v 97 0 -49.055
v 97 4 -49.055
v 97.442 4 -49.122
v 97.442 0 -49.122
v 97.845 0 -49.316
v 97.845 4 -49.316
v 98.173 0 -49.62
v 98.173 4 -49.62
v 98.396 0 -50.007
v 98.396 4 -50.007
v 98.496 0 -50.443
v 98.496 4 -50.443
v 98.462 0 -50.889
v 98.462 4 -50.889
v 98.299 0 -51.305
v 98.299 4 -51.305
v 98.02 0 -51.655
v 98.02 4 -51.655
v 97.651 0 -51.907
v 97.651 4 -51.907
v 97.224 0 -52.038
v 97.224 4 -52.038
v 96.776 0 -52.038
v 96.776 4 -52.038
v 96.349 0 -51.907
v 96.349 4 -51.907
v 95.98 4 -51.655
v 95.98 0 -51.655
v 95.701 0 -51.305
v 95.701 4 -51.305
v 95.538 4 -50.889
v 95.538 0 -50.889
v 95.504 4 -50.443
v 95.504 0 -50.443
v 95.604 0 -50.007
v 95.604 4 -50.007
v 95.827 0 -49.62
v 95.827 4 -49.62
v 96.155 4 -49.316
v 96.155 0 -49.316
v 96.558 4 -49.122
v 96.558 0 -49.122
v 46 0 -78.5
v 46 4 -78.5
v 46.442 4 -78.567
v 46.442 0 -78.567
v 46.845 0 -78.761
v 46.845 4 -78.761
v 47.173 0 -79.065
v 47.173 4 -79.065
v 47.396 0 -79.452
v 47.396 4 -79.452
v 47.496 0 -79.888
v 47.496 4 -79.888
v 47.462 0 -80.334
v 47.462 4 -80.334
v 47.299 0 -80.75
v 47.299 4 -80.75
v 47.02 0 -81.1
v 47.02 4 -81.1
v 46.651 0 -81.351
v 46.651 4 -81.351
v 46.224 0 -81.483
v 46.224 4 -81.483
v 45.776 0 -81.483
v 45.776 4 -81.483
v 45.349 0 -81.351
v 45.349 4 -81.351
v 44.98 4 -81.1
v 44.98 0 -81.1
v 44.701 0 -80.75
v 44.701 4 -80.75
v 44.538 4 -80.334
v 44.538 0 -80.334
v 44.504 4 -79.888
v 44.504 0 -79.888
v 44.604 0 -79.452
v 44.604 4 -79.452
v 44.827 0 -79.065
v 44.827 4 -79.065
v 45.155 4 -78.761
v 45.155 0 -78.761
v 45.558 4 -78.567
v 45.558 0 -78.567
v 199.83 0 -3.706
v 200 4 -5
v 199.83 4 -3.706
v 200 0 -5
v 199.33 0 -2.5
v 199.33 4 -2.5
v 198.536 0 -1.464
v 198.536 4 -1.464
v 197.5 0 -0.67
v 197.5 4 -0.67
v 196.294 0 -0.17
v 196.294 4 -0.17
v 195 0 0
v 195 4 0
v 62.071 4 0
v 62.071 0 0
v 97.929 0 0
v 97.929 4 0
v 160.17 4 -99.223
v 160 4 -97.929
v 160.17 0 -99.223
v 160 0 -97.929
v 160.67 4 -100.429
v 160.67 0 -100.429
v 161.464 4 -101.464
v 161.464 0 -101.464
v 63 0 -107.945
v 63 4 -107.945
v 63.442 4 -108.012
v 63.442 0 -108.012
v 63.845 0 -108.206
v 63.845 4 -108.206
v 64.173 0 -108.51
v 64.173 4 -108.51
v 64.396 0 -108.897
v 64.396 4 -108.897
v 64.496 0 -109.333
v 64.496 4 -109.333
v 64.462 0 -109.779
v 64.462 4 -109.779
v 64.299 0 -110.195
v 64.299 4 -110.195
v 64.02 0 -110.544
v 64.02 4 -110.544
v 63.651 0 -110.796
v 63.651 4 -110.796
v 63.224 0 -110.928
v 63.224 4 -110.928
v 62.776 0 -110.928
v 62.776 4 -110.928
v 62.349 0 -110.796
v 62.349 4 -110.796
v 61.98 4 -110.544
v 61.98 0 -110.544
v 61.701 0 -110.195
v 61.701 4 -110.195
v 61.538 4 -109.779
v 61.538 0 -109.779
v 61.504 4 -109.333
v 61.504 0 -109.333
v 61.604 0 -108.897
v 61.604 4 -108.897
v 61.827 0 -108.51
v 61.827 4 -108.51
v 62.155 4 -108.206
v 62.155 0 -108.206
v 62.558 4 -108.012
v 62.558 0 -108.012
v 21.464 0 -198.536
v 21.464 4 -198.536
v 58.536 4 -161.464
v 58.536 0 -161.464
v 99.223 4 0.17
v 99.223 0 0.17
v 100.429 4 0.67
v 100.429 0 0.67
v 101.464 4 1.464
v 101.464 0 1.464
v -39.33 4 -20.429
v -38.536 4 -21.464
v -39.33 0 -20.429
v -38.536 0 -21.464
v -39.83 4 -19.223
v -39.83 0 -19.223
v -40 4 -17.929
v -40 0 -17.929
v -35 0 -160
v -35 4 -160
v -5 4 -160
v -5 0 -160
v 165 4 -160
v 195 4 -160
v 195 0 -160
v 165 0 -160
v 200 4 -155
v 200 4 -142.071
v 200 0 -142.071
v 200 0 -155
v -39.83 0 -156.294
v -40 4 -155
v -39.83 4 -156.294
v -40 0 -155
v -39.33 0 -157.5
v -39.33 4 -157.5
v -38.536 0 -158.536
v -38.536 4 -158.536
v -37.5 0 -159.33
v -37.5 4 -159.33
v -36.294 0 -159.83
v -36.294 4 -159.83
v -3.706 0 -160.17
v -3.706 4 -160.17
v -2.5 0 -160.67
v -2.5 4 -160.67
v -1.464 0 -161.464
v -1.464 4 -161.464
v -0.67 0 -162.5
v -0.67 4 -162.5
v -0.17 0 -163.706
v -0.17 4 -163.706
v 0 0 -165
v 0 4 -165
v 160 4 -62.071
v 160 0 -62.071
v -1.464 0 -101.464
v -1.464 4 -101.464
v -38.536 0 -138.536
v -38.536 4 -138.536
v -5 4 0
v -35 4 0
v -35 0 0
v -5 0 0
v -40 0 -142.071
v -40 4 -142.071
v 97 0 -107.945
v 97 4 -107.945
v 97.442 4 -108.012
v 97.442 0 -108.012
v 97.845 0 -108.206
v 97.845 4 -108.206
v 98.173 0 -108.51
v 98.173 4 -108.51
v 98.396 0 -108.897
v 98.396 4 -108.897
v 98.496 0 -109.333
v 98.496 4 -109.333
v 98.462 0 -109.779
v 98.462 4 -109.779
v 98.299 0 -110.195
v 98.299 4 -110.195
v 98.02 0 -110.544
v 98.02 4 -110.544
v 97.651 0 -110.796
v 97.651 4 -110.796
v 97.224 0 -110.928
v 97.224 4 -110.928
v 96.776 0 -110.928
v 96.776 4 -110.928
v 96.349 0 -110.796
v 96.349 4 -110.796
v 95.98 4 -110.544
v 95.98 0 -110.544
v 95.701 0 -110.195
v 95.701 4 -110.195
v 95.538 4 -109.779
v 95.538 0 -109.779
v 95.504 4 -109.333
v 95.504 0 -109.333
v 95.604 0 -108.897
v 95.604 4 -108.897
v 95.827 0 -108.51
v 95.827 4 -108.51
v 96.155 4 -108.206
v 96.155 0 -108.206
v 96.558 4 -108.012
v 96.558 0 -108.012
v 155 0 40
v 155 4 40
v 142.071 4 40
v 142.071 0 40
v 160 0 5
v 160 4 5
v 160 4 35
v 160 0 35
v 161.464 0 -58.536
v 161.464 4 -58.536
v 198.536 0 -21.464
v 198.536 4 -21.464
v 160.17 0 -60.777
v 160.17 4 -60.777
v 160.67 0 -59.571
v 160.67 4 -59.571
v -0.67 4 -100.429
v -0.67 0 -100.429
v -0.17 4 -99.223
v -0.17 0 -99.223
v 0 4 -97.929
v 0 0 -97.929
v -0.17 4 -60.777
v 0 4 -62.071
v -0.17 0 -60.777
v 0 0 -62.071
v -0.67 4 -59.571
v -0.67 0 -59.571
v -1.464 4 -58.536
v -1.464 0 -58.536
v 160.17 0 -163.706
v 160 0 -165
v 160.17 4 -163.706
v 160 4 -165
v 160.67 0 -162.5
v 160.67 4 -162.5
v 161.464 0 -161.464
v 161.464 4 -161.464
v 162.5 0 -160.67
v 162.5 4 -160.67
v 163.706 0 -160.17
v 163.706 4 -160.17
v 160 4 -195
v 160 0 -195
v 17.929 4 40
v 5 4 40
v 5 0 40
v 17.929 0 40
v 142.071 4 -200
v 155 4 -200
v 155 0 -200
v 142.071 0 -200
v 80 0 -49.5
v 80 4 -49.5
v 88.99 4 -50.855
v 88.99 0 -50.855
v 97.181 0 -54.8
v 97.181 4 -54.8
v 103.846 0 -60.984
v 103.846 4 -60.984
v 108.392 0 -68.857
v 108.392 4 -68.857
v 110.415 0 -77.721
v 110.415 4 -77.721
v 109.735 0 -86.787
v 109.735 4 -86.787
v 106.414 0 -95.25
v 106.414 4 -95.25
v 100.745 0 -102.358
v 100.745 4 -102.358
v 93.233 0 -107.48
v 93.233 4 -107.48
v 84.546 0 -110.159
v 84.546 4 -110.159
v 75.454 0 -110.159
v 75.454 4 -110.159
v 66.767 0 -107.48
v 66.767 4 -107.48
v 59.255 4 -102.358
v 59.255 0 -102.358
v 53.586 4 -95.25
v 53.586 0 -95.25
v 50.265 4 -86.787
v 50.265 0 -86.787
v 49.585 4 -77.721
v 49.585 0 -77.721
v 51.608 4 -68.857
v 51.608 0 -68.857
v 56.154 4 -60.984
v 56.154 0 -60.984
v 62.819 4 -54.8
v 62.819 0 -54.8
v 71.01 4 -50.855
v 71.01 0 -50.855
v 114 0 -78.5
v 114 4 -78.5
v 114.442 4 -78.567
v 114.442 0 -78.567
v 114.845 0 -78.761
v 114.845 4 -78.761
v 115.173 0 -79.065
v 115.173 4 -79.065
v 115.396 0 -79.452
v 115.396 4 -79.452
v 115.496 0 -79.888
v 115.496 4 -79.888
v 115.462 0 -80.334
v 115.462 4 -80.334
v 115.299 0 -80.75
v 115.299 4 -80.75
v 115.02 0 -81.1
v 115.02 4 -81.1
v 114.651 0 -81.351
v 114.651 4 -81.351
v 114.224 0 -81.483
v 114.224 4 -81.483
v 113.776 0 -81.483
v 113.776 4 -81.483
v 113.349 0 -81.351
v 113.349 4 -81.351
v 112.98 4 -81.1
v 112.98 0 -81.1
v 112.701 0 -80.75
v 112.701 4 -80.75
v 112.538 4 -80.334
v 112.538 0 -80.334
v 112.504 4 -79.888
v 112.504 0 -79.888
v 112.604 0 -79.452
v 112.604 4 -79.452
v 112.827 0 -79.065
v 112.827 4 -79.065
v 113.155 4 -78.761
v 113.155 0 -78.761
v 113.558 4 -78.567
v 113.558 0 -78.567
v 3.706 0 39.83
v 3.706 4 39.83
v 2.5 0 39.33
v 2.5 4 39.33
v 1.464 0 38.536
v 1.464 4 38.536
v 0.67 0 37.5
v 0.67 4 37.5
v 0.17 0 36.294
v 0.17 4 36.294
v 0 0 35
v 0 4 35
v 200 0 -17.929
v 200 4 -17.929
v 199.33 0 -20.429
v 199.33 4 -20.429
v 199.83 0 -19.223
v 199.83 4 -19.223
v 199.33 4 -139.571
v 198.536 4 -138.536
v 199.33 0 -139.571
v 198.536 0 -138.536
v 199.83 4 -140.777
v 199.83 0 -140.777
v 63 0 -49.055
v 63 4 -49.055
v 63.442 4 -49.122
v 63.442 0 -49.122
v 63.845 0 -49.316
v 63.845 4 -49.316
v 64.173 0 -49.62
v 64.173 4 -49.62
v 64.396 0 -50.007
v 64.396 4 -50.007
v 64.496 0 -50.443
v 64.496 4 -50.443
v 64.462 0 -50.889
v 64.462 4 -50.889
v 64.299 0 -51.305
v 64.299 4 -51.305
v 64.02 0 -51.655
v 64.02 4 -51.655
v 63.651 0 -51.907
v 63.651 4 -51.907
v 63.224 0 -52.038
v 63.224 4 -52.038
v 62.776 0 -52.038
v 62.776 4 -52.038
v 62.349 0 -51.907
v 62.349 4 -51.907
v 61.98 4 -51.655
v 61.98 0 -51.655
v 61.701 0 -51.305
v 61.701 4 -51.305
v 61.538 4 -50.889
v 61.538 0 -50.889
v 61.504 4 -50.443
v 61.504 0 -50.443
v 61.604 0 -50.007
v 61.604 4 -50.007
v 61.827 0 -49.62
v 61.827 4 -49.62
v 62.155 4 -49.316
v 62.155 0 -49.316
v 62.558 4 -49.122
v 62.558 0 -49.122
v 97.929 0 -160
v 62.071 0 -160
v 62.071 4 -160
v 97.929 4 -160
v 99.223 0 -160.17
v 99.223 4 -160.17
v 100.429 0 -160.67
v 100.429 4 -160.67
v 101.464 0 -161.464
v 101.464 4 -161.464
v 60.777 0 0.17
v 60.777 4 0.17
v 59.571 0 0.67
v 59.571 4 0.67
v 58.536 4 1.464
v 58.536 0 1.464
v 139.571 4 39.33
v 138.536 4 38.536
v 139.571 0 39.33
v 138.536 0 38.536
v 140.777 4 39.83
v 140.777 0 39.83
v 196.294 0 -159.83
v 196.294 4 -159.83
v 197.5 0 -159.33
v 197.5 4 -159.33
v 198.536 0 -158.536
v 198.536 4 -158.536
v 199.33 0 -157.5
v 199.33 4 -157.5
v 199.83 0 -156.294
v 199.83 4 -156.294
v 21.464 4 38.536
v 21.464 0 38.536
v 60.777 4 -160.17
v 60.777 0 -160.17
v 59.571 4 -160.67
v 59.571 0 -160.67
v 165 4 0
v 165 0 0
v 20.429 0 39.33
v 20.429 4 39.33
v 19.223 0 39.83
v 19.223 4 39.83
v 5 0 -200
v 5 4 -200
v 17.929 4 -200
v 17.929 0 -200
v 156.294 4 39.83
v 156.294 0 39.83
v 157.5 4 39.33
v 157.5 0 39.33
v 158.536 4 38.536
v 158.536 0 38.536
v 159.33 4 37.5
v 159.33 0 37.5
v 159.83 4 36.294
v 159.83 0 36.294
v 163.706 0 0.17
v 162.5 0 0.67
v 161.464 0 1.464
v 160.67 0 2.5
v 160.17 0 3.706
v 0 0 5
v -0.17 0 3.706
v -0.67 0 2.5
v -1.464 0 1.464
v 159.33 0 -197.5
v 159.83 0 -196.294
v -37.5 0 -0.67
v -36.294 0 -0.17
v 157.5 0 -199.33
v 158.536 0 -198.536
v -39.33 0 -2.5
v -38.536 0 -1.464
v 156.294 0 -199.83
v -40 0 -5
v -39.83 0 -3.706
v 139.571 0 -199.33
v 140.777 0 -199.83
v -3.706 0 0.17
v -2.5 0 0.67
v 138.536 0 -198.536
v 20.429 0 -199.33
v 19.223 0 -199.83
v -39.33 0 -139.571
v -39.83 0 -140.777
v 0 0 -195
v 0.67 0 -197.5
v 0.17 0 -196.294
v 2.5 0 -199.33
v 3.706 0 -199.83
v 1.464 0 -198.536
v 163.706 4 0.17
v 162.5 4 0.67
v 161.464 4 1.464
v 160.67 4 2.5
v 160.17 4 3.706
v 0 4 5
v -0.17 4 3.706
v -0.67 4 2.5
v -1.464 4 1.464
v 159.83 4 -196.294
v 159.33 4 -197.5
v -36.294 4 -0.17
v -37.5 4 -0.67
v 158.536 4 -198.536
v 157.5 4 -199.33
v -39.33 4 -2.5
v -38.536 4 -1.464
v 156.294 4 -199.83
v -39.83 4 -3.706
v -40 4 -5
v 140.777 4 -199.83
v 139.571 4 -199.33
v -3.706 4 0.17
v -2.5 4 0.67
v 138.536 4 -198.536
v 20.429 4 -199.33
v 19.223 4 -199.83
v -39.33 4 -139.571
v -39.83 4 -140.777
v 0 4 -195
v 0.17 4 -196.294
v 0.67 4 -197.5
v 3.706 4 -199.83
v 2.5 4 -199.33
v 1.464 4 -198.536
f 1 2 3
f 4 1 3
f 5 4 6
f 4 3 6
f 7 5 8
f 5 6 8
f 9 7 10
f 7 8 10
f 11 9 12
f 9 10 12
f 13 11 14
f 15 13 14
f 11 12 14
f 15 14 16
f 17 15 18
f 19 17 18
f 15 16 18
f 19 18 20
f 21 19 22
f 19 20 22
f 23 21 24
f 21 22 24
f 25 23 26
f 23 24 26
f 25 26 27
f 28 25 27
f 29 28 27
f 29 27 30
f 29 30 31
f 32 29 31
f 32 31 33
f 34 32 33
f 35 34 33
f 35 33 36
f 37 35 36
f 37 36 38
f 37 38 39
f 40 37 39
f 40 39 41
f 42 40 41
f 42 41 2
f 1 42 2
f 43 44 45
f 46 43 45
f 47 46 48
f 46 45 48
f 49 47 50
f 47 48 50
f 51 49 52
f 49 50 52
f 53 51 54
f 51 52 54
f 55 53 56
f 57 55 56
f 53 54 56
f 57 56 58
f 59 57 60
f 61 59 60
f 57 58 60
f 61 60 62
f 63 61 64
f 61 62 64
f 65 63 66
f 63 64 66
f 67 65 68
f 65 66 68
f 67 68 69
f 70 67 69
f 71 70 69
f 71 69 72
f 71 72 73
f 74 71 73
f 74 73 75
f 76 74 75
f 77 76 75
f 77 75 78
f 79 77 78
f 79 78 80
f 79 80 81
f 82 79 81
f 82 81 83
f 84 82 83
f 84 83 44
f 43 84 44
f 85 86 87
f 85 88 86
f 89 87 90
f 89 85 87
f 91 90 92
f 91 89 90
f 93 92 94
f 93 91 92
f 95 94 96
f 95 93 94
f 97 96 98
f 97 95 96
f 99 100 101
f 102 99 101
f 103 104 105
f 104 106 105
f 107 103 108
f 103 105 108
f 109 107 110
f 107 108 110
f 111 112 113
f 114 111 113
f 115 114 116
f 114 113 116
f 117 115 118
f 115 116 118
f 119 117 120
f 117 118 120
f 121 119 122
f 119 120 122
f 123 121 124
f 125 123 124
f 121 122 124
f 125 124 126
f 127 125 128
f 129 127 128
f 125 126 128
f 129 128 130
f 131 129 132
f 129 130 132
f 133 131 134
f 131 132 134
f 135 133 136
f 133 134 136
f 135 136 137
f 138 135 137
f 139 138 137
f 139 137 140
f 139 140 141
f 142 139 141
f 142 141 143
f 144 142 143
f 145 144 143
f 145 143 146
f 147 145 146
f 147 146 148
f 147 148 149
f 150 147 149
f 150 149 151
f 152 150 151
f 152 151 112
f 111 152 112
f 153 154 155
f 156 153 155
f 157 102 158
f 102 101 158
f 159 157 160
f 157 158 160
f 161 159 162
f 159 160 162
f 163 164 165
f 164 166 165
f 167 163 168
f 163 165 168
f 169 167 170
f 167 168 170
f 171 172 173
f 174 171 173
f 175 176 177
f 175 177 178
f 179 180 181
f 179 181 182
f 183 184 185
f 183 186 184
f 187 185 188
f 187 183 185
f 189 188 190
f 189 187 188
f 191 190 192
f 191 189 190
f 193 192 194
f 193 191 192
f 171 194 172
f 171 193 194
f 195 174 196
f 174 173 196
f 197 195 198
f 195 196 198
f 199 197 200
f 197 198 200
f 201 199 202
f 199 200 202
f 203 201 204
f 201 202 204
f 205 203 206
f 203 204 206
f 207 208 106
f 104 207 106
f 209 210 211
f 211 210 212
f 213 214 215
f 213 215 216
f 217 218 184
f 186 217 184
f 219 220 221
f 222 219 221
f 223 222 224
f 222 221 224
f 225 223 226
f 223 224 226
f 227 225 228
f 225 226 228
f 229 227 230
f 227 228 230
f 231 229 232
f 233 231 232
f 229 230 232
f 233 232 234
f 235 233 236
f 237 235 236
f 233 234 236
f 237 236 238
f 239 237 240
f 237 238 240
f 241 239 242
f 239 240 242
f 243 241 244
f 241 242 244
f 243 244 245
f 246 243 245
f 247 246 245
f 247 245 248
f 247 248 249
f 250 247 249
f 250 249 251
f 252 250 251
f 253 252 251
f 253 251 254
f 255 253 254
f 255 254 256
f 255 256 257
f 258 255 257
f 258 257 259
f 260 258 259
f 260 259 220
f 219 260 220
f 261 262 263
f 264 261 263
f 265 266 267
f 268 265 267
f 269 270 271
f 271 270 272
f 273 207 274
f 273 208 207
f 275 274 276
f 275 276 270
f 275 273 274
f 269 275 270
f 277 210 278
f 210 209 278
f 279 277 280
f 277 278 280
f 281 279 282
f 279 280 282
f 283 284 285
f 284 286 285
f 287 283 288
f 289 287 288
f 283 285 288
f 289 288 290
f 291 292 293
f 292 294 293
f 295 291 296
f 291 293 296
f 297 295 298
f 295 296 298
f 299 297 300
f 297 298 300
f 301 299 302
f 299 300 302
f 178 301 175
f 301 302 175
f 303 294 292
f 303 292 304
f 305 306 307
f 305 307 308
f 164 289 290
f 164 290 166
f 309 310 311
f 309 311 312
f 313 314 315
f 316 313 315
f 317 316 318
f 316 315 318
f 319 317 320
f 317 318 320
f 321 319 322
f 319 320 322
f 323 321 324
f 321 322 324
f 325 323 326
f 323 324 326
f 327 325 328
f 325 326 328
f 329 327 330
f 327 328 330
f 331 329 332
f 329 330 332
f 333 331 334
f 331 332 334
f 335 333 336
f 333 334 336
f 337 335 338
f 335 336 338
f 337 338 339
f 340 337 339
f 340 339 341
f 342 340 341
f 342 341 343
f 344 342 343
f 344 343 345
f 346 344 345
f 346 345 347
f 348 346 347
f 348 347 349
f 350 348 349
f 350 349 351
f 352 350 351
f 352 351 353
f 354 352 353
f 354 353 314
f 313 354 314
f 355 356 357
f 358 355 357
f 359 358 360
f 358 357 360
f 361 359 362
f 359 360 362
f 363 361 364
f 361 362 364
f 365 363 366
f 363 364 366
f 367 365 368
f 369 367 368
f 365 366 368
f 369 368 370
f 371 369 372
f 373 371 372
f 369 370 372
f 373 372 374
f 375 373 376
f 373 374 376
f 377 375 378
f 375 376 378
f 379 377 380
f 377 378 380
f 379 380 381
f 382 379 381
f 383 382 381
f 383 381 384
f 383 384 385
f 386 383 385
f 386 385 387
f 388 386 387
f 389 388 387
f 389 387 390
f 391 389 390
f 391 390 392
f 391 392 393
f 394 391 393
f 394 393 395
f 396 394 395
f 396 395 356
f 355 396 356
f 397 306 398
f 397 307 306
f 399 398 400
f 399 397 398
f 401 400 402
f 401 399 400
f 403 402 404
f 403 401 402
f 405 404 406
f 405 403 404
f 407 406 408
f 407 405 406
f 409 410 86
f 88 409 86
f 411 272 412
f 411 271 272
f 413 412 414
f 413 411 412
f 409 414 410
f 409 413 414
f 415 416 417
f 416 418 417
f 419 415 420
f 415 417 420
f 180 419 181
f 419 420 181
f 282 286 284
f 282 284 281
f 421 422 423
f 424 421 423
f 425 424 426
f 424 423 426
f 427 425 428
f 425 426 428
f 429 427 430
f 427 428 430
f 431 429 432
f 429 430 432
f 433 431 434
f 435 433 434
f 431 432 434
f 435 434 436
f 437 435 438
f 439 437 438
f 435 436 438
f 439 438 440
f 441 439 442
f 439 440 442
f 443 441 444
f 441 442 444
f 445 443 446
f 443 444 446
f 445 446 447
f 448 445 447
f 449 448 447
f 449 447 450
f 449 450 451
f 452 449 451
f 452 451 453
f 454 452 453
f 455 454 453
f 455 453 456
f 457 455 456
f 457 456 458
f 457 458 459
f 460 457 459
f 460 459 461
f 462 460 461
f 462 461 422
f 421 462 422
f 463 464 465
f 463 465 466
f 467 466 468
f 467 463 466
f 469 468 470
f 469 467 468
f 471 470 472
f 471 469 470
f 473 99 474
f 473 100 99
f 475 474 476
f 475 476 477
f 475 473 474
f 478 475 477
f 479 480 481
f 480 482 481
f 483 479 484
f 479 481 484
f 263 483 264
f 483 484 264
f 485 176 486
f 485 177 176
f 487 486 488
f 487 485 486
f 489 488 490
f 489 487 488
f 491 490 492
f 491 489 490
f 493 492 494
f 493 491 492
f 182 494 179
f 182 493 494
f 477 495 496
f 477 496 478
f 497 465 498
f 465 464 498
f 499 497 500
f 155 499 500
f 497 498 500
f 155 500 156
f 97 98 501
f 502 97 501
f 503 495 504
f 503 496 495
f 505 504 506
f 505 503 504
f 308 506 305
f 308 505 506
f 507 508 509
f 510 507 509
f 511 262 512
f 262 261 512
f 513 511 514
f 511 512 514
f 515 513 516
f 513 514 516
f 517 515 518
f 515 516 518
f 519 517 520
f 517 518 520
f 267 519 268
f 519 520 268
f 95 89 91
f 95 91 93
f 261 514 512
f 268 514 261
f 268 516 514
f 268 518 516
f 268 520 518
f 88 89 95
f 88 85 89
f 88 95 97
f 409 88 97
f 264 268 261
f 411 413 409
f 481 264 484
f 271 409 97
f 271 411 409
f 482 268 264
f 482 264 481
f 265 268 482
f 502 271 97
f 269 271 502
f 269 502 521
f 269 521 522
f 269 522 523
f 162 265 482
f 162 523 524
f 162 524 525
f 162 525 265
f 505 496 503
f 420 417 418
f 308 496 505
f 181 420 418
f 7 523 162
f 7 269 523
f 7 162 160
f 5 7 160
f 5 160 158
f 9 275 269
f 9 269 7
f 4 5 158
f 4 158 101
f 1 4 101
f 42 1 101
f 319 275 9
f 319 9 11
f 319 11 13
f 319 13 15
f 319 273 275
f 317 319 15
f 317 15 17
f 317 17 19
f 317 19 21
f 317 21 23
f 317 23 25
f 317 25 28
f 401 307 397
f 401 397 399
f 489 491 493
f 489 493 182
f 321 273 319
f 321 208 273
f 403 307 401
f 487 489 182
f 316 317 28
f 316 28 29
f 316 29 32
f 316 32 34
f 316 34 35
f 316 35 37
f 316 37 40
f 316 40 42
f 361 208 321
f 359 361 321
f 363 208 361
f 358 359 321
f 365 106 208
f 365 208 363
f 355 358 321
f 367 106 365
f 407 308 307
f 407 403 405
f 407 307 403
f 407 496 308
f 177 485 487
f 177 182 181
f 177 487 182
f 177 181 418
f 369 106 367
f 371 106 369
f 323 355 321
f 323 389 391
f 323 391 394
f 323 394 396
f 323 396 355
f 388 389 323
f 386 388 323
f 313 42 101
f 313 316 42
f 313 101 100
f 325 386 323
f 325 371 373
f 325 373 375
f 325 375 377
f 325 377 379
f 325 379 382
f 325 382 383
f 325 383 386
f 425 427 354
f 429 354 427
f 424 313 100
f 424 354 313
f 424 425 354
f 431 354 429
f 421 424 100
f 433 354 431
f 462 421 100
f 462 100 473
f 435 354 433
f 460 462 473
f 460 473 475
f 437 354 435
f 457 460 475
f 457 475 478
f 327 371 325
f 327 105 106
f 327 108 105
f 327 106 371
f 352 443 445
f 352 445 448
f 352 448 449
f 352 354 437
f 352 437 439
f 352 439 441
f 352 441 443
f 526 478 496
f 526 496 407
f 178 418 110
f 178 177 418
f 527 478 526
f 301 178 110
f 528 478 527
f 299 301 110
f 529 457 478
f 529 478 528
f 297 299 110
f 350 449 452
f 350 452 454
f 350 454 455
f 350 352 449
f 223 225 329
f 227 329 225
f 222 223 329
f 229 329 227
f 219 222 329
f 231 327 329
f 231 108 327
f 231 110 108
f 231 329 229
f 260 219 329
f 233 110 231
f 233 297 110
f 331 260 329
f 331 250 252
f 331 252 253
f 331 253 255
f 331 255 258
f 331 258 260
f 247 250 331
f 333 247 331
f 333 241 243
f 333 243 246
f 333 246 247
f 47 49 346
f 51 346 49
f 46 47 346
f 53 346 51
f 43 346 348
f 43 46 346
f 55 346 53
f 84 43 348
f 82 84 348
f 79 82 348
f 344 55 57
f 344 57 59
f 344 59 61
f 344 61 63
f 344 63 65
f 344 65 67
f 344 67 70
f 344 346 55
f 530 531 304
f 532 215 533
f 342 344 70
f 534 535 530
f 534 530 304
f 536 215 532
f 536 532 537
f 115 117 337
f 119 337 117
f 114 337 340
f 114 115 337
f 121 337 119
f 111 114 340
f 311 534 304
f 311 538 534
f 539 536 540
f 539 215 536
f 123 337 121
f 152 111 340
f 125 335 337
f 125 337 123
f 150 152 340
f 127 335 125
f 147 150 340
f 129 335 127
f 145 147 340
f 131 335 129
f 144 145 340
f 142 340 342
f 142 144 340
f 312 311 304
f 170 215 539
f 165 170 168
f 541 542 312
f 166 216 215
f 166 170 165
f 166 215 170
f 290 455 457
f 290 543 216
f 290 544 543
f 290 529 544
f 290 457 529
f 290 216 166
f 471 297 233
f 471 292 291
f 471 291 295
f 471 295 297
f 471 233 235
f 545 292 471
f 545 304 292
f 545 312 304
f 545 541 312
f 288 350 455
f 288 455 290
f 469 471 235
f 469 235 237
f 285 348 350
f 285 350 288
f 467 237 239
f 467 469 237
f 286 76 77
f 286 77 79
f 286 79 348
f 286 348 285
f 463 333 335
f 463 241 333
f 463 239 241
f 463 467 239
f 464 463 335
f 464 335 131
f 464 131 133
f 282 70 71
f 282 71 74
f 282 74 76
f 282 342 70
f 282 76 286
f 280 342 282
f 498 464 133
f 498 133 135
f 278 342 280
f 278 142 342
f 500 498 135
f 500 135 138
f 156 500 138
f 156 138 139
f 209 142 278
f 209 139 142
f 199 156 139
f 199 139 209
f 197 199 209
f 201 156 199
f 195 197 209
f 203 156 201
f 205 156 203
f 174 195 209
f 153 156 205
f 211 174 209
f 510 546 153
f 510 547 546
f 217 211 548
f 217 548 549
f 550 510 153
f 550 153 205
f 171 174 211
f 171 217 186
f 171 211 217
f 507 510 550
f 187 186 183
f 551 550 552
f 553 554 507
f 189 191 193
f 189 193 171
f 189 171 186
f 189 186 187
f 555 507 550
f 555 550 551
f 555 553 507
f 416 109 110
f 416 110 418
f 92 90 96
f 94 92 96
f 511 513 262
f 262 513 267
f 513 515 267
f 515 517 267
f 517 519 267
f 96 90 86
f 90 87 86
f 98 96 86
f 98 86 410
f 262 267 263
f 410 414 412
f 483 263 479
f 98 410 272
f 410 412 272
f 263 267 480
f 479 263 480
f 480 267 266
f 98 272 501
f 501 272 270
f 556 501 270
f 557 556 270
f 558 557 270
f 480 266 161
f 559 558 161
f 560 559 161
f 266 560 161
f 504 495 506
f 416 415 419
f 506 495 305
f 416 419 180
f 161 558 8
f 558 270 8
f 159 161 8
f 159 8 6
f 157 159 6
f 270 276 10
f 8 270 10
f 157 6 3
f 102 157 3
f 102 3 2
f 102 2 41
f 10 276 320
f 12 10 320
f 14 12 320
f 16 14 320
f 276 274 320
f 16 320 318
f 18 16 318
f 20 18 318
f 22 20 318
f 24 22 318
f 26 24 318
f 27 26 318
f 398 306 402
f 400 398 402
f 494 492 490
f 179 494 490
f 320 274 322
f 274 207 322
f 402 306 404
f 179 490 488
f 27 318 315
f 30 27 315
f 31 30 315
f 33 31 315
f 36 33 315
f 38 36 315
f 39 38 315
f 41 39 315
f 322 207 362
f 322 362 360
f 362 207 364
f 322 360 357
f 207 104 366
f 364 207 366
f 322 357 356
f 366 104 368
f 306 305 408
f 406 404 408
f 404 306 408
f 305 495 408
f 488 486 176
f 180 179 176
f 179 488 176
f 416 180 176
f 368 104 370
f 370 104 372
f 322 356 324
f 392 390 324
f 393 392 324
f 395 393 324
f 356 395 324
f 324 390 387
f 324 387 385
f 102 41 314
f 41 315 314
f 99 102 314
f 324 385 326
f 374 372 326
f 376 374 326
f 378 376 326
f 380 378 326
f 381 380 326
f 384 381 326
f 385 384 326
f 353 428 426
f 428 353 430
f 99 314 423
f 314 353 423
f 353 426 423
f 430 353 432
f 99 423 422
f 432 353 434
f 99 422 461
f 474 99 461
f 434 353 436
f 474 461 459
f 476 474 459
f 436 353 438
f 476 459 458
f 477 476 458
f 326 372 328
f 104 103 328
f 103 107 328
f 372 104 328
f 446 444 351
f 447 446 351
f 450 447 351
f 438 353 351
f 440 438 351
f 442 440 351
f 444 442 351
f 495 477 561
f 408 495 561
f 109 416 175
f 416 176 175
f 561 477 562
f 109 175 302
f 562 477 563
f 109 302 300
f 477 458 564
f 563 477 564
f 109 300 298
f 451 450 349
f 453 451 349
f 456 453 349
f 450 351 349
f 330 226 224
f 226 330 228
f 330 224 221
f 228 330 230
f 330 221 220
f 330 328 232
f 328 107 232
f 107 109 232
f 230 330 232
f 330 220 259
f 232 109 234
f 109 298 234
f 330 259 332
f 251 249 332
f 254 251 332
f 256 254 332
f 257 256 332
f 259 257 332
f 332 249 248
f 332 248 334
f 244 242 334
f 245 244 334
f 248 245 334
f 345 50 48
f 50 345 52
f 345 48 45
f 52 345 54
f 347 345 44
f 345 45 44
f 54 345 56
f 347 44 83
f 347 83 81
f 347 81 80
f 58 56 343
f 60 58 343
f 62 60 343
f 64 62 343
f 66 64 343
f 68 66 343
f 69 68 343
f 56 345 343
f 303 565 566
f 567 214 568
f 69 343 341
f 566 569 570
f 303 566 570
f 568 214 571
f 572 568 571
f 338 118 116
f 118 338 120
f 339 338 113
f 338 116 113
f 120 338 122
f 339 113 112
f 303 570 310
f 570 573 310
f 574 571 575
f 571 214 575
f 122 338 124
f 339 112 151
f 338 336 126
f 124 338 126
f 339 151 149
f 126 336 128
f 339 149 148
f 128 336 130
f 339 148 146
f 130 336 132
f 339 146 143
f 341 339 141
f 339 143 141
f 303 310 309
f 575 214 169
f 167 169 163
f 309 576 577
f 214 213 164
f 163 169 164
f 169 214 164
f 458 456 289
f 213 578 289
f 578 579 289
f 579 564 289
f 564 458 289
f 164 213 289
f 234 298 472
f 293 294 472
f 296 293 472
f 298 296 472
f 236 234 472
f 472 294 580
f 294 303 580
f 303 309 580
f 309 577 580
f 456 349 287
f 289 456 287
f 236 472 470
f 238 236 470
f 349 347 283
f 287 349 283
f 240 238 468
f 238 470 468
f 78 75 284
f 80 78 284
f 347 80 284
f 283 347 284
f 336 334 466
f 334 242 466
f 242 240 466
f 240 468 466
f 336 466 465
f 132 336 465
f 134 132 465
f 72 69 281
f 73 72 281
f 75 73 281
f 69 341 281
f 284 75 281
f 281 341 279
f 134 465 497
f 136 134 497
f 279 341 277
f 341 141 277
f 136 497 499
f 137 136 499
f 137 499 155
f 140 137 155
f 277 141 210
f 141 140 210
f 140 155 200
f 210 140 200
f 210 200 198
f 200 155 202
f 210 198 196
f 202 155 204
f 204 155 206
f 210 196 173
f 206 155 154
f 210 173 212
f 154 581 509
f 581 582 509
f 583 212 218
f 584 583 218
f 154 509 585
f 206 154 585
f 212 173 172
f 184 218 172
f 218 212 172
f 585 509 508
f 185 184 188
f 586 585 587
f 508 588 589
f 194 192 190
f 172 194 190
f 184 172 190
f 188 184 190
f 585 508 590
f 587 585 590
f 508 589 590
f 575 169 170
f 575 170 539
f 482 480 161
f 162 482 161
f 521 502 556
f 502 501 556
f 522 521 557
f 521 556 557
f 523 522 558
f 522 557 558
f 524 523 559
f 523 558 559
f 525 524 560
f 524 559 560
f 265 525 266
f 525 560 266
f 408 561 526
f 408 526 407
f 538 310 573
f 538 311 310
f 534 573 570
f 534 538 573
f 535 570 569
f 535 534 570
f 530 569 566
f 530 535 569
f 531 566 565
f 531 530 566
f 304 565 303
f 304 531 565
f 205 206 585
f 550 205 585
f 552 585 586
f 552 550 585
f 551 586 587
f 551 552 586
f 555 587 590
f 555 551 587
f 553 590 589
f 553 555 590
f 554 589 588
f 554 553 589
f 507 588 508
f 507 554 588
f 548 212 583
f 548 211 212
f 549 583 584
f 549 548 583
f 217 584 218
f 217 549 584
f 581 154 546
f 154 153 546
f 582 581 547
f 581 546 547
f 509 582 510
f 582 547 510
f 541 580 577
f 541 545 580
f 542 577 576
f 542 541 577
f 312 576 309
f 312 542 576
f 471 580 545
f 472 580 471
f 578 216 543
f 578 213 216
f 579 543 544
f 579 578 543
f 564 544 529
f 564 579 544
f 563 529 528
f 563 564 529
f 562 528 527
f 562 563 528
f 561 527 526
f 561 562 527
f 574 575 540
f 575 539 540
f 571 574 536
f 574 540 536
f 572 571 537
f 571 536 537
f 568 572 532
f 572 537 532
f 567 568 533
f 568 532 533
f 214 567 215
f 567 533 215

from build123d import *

# Parameters (mm, degrees)
SKETCH_1_W          = 160
SKETCH_1_H          = 160
EXTRUDE_1_DEPTH     = 4
EXTRUDE_2_DEPTH     = 4
FILLET_1_R          = 5
SKETCH_3_R          = 30.5
SKETCH_3_R_2        = 1.5
CUT_EXTRUDE_1_DEPTH = 10


with BuildPart() as part:
    # 草图1 → 凸台-拉伸1 (new body)
    with BuildSketch(Plane(origin=(0, 0, 0), x_dir=(1, 0, 0), z_dir=(0, 1, 0))):
        with Locations((80, 80)):
            Rectangle(SKETCH_1_W, SKETCH_1_H)
    extrude(amount=EXTRUDE_1_DEPTH)

    # 草图2 → 凸台-拉伸2 (add)
    with BuildSketch(Plane(origin=(0, 4, 0), x_dir=(1, 0, 0), z_dir=(0, 1, 0))):
        Polygon((0, 100), (-40, 140), (-40, 160), (0, 160), (0, 200), (20, 200), (60, 160), align=None)
        Polygon((60, 0), (0, 60), (-40, 20), (-40, 0), (0, 0), (0, -40), (20, -40), align=None)
        Polygon((160, 60), (200, 20), (200, 0), (160, 0), (160, -40), (140, -40), (100, 0), align=None)
        Polygon((100, 160), (160, 100), (200, 140), (200, 160), (160, 160), (160, 200), (140, 200), align=None)
    extrude(amount=-EXTRUDE_2_DEPTH)

    # 圆角1
    fillet_1_edges = [part.edges().sort_by_distance(p)[0] for p in [
        (160, 2, -100),
        (200, 2, -140),
        (200, 2, -160),
        (160, 2, -160),
        (160, 2, -200),
        (140, 2, -200),
        (100, 2, -160),
        (140, 2, 40),
        (160, 2, 40),
        (160, 2, 0),
        (200, 2, 0),
        (200, 2, -20),
        (160, 2, -60),
        (100, 2, 0),
        (0, 2, -60),
        (-40, 2, -20),
        (-40, 2, 0),
        (0, 2, 0),
        (0, 2, 40),
        (20, 2, 40),
        (60, 2, 0),
        (20, 2, -200),
        (0, 2, -200),
        (0, 2, -160),
        (-40, 2, -160),
        (-40, 2, -140),
        (0, 2, -100),
        (60, 2, -160),
    ]]
    fillet(fillet_1_edges, radius=FILLET_1_R)

    # 草图3 → 切除-拉伸1 (cut)
    with BuildSketch(Plane(origin=(0, 4, 0), x_dir=(1, 0, 0), z_dir=(0, 1, 0))):
        with Locations(Location((80, 80, 0), (0, 0, 270))):
            Circle(SKETCH_3_R)
        with Locations(Location((97, 109.444863729, 0), (0, 0, 270))):
            Circle(SKETCH_3_R_2)
        with Locations(Location((114, 80, 0), (0, 0, 270))):
            Circle(SKETCH_3_R_2)
        with Locations(Location((97, 50.555136271, 0), (0, 0, 270))):
            Circle(SKETCH_3_R_2)
        with Locations(Location((63, 50.555136271, 0), (0, 0, 270))):
            Circle(SKETCH_3_R_2)
        with Locations(Location((46, 80, 0), (0, 0, 270))):
            Circle(SKETCH_3_R_2)
        with Locations(Location((63, 109.444863729, 0), (0, 0, 270))):
            Circle(SKETCH_3_R_2)
    extrude(amount=-CUT_EXTRUDE_1_DEPTH, mode=Mode.SUBTRACT)


solid = part.part
